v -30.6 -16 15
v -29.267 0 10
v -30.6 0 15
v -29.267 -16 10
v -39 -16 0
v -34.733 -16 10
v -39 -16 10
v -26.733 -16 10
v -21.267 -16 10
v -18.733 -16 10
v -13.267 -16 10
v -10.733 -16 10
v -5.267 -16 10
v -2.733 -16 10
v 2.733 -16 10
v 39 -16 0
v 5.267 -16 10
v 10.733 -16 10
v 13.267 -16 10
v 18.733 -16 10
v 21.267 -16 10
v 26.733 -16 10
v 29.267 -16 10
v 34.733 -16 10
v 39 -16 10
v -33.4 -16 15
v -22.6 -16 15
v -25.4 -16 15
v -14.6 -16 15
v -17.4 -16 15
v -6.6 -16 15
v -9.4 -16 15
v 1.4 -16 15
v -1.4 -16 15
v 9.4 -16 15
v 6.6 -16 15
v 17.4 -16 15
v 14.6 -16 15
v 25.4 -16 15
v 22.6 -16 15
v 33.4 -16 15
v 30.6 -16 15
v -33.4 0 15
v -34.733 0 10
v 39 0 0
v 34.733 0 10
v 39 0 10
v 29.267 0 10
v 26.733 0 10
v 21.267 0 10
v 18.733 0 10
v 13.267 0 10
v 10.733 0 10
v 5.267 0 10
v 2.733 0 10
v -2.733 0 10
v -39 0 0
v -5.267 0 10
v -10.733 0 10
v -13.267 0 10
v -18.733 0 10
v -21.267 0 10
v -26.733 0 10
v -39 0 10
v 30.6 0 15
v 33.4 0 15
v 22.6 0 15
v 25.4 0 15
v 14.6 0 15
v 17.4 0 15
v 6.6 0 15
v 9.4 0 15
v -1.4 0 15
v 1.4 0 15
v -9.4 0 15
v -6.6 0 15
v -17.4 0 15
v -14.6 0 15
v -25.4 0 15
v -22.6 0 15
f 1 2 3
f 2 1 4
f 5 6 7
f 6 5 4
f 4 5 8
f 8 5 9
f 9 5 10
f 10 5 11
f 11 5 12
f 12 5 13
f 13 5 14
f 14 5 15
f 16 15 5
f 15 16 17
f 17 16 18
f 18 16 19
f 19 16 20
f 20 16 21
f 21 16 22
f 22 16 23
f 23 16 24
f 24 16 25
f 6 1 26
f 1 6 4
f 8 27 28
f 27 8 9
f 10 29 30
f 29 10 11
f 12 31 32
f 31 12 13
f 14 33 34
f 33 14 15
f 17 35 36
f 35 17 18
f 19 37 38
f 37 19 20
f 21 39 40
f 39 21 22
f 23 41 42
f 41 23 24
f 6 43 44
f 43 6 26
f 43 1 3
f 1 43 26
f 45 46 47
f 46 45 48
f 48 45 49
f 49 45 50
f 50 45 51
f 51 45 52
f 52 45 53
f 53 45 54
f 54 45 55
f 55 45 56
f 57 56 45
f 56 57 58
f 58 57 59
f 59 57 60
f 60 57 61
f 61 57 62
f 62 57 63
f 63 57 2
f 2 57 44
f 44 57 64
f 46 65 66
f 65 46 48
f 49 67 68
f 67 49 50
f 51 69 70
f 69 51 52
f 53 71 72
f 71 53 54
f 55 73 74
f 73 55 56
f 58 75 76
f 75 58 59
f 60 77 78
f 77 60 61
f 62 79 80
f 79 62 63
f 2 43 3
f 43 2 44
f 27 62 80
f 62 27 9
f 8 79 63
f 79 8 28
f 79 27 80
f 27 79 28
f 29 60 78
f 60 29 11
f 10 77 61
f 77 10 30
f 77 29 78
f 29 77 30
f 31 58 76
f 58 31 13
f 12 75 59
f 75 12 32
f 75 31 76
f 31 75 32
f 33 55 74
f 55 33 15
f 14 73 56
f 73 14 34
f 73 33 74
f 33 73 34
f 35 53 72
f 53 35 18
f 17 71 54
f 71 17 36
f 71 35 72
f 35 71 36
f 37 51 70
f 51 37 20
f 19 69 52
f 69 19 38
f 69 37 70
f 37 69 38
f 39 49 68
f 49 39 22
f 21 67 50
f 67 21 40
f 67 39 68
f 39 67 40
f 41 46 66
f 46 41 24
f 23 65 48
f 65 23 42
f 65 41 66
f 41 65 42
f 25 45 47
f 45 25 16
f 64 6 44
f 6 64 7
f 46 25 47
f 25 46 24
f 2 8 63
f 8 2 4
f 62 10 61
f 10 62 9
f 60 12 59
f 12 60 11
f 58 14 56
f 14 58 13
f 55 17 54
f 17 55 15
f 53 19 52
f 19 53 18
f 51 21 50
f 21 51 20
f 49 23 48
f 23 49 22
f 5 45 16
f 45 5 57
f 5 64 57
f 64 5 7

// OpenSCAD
$fn = 32;

// ----------------------------------------------------------------------
// Toothed rack, 9 teeth
// 8 mm pitch, 5 mm teeth
// ----------------------------------------------------------------------

// --- parameters (mm) ---
bar_w = 16;     // bar width (Y)
bar_h = 10;     // bar height (Z)
teeth = 9;      // number of teeth
pitch = 8;      // tooth pitch
tooth_h = 5;    // tooth height above the bar
root_w = 6;     // tooth width at the root
crest_w = 2.8;  // tooth width at the crest

// --- derived feature positions (mm) ---
span = (teeth - 1) * pitch;  // = 64   distance between the outer teeth
bar_l = span + root_w + 8;   // = 78   bar length: teeth plus 4 mm at each end
tooth_x = -span / 2;         // = -32   X of the first tooth
height = bar_h + tooth_h;    // = 15   overall height
feature_centers = [
  [tooth_x + 0 * pitch, -bar_w / 2],
  [tooth_x + 1 * pitch, -bar_w / 2],
  [tooth_x + 2 * pitch, -bar_w / 2],
  [tooth_x + 3 * pitch, -bar_w / 2],
  [tooth_x + 4 * pitch, -bar_w / 2],
  [tooth_x + 5 * pitch, -bar_w / 2],
  [tooth_x + 6 * pitch, -bar_w / 2],
  [tooth_x + 7 * pitch, -bar_w / 2],
  [tooth_x + 8 * pitch, -bar_w / 2]
];   // tooth centre line, drives the tooth loop

// bar with a rack of teeth, one extruded trapezoium per centre
module rack_tooth() {
  linear_extrude(height = bar_w)
    polygon(points = [
      [0, 0],
      [root_w, 0],
      [root_w / 2 + crest_w / 2, tooth_h + 1],
      [root_w / 2 - crest_w / 2, tooth_h + 1]
    ]);
}

union() {
  translate([-bar_l / 2, -bar_w, 0]) cube([bar_l, bar_w, bar_h]);
  for (centre = feature_centers)
    translate([centre[0] - root_w / 2, 0, bar_h - 1]) rotate([90, 0, 0]) rack_tooth();
}
